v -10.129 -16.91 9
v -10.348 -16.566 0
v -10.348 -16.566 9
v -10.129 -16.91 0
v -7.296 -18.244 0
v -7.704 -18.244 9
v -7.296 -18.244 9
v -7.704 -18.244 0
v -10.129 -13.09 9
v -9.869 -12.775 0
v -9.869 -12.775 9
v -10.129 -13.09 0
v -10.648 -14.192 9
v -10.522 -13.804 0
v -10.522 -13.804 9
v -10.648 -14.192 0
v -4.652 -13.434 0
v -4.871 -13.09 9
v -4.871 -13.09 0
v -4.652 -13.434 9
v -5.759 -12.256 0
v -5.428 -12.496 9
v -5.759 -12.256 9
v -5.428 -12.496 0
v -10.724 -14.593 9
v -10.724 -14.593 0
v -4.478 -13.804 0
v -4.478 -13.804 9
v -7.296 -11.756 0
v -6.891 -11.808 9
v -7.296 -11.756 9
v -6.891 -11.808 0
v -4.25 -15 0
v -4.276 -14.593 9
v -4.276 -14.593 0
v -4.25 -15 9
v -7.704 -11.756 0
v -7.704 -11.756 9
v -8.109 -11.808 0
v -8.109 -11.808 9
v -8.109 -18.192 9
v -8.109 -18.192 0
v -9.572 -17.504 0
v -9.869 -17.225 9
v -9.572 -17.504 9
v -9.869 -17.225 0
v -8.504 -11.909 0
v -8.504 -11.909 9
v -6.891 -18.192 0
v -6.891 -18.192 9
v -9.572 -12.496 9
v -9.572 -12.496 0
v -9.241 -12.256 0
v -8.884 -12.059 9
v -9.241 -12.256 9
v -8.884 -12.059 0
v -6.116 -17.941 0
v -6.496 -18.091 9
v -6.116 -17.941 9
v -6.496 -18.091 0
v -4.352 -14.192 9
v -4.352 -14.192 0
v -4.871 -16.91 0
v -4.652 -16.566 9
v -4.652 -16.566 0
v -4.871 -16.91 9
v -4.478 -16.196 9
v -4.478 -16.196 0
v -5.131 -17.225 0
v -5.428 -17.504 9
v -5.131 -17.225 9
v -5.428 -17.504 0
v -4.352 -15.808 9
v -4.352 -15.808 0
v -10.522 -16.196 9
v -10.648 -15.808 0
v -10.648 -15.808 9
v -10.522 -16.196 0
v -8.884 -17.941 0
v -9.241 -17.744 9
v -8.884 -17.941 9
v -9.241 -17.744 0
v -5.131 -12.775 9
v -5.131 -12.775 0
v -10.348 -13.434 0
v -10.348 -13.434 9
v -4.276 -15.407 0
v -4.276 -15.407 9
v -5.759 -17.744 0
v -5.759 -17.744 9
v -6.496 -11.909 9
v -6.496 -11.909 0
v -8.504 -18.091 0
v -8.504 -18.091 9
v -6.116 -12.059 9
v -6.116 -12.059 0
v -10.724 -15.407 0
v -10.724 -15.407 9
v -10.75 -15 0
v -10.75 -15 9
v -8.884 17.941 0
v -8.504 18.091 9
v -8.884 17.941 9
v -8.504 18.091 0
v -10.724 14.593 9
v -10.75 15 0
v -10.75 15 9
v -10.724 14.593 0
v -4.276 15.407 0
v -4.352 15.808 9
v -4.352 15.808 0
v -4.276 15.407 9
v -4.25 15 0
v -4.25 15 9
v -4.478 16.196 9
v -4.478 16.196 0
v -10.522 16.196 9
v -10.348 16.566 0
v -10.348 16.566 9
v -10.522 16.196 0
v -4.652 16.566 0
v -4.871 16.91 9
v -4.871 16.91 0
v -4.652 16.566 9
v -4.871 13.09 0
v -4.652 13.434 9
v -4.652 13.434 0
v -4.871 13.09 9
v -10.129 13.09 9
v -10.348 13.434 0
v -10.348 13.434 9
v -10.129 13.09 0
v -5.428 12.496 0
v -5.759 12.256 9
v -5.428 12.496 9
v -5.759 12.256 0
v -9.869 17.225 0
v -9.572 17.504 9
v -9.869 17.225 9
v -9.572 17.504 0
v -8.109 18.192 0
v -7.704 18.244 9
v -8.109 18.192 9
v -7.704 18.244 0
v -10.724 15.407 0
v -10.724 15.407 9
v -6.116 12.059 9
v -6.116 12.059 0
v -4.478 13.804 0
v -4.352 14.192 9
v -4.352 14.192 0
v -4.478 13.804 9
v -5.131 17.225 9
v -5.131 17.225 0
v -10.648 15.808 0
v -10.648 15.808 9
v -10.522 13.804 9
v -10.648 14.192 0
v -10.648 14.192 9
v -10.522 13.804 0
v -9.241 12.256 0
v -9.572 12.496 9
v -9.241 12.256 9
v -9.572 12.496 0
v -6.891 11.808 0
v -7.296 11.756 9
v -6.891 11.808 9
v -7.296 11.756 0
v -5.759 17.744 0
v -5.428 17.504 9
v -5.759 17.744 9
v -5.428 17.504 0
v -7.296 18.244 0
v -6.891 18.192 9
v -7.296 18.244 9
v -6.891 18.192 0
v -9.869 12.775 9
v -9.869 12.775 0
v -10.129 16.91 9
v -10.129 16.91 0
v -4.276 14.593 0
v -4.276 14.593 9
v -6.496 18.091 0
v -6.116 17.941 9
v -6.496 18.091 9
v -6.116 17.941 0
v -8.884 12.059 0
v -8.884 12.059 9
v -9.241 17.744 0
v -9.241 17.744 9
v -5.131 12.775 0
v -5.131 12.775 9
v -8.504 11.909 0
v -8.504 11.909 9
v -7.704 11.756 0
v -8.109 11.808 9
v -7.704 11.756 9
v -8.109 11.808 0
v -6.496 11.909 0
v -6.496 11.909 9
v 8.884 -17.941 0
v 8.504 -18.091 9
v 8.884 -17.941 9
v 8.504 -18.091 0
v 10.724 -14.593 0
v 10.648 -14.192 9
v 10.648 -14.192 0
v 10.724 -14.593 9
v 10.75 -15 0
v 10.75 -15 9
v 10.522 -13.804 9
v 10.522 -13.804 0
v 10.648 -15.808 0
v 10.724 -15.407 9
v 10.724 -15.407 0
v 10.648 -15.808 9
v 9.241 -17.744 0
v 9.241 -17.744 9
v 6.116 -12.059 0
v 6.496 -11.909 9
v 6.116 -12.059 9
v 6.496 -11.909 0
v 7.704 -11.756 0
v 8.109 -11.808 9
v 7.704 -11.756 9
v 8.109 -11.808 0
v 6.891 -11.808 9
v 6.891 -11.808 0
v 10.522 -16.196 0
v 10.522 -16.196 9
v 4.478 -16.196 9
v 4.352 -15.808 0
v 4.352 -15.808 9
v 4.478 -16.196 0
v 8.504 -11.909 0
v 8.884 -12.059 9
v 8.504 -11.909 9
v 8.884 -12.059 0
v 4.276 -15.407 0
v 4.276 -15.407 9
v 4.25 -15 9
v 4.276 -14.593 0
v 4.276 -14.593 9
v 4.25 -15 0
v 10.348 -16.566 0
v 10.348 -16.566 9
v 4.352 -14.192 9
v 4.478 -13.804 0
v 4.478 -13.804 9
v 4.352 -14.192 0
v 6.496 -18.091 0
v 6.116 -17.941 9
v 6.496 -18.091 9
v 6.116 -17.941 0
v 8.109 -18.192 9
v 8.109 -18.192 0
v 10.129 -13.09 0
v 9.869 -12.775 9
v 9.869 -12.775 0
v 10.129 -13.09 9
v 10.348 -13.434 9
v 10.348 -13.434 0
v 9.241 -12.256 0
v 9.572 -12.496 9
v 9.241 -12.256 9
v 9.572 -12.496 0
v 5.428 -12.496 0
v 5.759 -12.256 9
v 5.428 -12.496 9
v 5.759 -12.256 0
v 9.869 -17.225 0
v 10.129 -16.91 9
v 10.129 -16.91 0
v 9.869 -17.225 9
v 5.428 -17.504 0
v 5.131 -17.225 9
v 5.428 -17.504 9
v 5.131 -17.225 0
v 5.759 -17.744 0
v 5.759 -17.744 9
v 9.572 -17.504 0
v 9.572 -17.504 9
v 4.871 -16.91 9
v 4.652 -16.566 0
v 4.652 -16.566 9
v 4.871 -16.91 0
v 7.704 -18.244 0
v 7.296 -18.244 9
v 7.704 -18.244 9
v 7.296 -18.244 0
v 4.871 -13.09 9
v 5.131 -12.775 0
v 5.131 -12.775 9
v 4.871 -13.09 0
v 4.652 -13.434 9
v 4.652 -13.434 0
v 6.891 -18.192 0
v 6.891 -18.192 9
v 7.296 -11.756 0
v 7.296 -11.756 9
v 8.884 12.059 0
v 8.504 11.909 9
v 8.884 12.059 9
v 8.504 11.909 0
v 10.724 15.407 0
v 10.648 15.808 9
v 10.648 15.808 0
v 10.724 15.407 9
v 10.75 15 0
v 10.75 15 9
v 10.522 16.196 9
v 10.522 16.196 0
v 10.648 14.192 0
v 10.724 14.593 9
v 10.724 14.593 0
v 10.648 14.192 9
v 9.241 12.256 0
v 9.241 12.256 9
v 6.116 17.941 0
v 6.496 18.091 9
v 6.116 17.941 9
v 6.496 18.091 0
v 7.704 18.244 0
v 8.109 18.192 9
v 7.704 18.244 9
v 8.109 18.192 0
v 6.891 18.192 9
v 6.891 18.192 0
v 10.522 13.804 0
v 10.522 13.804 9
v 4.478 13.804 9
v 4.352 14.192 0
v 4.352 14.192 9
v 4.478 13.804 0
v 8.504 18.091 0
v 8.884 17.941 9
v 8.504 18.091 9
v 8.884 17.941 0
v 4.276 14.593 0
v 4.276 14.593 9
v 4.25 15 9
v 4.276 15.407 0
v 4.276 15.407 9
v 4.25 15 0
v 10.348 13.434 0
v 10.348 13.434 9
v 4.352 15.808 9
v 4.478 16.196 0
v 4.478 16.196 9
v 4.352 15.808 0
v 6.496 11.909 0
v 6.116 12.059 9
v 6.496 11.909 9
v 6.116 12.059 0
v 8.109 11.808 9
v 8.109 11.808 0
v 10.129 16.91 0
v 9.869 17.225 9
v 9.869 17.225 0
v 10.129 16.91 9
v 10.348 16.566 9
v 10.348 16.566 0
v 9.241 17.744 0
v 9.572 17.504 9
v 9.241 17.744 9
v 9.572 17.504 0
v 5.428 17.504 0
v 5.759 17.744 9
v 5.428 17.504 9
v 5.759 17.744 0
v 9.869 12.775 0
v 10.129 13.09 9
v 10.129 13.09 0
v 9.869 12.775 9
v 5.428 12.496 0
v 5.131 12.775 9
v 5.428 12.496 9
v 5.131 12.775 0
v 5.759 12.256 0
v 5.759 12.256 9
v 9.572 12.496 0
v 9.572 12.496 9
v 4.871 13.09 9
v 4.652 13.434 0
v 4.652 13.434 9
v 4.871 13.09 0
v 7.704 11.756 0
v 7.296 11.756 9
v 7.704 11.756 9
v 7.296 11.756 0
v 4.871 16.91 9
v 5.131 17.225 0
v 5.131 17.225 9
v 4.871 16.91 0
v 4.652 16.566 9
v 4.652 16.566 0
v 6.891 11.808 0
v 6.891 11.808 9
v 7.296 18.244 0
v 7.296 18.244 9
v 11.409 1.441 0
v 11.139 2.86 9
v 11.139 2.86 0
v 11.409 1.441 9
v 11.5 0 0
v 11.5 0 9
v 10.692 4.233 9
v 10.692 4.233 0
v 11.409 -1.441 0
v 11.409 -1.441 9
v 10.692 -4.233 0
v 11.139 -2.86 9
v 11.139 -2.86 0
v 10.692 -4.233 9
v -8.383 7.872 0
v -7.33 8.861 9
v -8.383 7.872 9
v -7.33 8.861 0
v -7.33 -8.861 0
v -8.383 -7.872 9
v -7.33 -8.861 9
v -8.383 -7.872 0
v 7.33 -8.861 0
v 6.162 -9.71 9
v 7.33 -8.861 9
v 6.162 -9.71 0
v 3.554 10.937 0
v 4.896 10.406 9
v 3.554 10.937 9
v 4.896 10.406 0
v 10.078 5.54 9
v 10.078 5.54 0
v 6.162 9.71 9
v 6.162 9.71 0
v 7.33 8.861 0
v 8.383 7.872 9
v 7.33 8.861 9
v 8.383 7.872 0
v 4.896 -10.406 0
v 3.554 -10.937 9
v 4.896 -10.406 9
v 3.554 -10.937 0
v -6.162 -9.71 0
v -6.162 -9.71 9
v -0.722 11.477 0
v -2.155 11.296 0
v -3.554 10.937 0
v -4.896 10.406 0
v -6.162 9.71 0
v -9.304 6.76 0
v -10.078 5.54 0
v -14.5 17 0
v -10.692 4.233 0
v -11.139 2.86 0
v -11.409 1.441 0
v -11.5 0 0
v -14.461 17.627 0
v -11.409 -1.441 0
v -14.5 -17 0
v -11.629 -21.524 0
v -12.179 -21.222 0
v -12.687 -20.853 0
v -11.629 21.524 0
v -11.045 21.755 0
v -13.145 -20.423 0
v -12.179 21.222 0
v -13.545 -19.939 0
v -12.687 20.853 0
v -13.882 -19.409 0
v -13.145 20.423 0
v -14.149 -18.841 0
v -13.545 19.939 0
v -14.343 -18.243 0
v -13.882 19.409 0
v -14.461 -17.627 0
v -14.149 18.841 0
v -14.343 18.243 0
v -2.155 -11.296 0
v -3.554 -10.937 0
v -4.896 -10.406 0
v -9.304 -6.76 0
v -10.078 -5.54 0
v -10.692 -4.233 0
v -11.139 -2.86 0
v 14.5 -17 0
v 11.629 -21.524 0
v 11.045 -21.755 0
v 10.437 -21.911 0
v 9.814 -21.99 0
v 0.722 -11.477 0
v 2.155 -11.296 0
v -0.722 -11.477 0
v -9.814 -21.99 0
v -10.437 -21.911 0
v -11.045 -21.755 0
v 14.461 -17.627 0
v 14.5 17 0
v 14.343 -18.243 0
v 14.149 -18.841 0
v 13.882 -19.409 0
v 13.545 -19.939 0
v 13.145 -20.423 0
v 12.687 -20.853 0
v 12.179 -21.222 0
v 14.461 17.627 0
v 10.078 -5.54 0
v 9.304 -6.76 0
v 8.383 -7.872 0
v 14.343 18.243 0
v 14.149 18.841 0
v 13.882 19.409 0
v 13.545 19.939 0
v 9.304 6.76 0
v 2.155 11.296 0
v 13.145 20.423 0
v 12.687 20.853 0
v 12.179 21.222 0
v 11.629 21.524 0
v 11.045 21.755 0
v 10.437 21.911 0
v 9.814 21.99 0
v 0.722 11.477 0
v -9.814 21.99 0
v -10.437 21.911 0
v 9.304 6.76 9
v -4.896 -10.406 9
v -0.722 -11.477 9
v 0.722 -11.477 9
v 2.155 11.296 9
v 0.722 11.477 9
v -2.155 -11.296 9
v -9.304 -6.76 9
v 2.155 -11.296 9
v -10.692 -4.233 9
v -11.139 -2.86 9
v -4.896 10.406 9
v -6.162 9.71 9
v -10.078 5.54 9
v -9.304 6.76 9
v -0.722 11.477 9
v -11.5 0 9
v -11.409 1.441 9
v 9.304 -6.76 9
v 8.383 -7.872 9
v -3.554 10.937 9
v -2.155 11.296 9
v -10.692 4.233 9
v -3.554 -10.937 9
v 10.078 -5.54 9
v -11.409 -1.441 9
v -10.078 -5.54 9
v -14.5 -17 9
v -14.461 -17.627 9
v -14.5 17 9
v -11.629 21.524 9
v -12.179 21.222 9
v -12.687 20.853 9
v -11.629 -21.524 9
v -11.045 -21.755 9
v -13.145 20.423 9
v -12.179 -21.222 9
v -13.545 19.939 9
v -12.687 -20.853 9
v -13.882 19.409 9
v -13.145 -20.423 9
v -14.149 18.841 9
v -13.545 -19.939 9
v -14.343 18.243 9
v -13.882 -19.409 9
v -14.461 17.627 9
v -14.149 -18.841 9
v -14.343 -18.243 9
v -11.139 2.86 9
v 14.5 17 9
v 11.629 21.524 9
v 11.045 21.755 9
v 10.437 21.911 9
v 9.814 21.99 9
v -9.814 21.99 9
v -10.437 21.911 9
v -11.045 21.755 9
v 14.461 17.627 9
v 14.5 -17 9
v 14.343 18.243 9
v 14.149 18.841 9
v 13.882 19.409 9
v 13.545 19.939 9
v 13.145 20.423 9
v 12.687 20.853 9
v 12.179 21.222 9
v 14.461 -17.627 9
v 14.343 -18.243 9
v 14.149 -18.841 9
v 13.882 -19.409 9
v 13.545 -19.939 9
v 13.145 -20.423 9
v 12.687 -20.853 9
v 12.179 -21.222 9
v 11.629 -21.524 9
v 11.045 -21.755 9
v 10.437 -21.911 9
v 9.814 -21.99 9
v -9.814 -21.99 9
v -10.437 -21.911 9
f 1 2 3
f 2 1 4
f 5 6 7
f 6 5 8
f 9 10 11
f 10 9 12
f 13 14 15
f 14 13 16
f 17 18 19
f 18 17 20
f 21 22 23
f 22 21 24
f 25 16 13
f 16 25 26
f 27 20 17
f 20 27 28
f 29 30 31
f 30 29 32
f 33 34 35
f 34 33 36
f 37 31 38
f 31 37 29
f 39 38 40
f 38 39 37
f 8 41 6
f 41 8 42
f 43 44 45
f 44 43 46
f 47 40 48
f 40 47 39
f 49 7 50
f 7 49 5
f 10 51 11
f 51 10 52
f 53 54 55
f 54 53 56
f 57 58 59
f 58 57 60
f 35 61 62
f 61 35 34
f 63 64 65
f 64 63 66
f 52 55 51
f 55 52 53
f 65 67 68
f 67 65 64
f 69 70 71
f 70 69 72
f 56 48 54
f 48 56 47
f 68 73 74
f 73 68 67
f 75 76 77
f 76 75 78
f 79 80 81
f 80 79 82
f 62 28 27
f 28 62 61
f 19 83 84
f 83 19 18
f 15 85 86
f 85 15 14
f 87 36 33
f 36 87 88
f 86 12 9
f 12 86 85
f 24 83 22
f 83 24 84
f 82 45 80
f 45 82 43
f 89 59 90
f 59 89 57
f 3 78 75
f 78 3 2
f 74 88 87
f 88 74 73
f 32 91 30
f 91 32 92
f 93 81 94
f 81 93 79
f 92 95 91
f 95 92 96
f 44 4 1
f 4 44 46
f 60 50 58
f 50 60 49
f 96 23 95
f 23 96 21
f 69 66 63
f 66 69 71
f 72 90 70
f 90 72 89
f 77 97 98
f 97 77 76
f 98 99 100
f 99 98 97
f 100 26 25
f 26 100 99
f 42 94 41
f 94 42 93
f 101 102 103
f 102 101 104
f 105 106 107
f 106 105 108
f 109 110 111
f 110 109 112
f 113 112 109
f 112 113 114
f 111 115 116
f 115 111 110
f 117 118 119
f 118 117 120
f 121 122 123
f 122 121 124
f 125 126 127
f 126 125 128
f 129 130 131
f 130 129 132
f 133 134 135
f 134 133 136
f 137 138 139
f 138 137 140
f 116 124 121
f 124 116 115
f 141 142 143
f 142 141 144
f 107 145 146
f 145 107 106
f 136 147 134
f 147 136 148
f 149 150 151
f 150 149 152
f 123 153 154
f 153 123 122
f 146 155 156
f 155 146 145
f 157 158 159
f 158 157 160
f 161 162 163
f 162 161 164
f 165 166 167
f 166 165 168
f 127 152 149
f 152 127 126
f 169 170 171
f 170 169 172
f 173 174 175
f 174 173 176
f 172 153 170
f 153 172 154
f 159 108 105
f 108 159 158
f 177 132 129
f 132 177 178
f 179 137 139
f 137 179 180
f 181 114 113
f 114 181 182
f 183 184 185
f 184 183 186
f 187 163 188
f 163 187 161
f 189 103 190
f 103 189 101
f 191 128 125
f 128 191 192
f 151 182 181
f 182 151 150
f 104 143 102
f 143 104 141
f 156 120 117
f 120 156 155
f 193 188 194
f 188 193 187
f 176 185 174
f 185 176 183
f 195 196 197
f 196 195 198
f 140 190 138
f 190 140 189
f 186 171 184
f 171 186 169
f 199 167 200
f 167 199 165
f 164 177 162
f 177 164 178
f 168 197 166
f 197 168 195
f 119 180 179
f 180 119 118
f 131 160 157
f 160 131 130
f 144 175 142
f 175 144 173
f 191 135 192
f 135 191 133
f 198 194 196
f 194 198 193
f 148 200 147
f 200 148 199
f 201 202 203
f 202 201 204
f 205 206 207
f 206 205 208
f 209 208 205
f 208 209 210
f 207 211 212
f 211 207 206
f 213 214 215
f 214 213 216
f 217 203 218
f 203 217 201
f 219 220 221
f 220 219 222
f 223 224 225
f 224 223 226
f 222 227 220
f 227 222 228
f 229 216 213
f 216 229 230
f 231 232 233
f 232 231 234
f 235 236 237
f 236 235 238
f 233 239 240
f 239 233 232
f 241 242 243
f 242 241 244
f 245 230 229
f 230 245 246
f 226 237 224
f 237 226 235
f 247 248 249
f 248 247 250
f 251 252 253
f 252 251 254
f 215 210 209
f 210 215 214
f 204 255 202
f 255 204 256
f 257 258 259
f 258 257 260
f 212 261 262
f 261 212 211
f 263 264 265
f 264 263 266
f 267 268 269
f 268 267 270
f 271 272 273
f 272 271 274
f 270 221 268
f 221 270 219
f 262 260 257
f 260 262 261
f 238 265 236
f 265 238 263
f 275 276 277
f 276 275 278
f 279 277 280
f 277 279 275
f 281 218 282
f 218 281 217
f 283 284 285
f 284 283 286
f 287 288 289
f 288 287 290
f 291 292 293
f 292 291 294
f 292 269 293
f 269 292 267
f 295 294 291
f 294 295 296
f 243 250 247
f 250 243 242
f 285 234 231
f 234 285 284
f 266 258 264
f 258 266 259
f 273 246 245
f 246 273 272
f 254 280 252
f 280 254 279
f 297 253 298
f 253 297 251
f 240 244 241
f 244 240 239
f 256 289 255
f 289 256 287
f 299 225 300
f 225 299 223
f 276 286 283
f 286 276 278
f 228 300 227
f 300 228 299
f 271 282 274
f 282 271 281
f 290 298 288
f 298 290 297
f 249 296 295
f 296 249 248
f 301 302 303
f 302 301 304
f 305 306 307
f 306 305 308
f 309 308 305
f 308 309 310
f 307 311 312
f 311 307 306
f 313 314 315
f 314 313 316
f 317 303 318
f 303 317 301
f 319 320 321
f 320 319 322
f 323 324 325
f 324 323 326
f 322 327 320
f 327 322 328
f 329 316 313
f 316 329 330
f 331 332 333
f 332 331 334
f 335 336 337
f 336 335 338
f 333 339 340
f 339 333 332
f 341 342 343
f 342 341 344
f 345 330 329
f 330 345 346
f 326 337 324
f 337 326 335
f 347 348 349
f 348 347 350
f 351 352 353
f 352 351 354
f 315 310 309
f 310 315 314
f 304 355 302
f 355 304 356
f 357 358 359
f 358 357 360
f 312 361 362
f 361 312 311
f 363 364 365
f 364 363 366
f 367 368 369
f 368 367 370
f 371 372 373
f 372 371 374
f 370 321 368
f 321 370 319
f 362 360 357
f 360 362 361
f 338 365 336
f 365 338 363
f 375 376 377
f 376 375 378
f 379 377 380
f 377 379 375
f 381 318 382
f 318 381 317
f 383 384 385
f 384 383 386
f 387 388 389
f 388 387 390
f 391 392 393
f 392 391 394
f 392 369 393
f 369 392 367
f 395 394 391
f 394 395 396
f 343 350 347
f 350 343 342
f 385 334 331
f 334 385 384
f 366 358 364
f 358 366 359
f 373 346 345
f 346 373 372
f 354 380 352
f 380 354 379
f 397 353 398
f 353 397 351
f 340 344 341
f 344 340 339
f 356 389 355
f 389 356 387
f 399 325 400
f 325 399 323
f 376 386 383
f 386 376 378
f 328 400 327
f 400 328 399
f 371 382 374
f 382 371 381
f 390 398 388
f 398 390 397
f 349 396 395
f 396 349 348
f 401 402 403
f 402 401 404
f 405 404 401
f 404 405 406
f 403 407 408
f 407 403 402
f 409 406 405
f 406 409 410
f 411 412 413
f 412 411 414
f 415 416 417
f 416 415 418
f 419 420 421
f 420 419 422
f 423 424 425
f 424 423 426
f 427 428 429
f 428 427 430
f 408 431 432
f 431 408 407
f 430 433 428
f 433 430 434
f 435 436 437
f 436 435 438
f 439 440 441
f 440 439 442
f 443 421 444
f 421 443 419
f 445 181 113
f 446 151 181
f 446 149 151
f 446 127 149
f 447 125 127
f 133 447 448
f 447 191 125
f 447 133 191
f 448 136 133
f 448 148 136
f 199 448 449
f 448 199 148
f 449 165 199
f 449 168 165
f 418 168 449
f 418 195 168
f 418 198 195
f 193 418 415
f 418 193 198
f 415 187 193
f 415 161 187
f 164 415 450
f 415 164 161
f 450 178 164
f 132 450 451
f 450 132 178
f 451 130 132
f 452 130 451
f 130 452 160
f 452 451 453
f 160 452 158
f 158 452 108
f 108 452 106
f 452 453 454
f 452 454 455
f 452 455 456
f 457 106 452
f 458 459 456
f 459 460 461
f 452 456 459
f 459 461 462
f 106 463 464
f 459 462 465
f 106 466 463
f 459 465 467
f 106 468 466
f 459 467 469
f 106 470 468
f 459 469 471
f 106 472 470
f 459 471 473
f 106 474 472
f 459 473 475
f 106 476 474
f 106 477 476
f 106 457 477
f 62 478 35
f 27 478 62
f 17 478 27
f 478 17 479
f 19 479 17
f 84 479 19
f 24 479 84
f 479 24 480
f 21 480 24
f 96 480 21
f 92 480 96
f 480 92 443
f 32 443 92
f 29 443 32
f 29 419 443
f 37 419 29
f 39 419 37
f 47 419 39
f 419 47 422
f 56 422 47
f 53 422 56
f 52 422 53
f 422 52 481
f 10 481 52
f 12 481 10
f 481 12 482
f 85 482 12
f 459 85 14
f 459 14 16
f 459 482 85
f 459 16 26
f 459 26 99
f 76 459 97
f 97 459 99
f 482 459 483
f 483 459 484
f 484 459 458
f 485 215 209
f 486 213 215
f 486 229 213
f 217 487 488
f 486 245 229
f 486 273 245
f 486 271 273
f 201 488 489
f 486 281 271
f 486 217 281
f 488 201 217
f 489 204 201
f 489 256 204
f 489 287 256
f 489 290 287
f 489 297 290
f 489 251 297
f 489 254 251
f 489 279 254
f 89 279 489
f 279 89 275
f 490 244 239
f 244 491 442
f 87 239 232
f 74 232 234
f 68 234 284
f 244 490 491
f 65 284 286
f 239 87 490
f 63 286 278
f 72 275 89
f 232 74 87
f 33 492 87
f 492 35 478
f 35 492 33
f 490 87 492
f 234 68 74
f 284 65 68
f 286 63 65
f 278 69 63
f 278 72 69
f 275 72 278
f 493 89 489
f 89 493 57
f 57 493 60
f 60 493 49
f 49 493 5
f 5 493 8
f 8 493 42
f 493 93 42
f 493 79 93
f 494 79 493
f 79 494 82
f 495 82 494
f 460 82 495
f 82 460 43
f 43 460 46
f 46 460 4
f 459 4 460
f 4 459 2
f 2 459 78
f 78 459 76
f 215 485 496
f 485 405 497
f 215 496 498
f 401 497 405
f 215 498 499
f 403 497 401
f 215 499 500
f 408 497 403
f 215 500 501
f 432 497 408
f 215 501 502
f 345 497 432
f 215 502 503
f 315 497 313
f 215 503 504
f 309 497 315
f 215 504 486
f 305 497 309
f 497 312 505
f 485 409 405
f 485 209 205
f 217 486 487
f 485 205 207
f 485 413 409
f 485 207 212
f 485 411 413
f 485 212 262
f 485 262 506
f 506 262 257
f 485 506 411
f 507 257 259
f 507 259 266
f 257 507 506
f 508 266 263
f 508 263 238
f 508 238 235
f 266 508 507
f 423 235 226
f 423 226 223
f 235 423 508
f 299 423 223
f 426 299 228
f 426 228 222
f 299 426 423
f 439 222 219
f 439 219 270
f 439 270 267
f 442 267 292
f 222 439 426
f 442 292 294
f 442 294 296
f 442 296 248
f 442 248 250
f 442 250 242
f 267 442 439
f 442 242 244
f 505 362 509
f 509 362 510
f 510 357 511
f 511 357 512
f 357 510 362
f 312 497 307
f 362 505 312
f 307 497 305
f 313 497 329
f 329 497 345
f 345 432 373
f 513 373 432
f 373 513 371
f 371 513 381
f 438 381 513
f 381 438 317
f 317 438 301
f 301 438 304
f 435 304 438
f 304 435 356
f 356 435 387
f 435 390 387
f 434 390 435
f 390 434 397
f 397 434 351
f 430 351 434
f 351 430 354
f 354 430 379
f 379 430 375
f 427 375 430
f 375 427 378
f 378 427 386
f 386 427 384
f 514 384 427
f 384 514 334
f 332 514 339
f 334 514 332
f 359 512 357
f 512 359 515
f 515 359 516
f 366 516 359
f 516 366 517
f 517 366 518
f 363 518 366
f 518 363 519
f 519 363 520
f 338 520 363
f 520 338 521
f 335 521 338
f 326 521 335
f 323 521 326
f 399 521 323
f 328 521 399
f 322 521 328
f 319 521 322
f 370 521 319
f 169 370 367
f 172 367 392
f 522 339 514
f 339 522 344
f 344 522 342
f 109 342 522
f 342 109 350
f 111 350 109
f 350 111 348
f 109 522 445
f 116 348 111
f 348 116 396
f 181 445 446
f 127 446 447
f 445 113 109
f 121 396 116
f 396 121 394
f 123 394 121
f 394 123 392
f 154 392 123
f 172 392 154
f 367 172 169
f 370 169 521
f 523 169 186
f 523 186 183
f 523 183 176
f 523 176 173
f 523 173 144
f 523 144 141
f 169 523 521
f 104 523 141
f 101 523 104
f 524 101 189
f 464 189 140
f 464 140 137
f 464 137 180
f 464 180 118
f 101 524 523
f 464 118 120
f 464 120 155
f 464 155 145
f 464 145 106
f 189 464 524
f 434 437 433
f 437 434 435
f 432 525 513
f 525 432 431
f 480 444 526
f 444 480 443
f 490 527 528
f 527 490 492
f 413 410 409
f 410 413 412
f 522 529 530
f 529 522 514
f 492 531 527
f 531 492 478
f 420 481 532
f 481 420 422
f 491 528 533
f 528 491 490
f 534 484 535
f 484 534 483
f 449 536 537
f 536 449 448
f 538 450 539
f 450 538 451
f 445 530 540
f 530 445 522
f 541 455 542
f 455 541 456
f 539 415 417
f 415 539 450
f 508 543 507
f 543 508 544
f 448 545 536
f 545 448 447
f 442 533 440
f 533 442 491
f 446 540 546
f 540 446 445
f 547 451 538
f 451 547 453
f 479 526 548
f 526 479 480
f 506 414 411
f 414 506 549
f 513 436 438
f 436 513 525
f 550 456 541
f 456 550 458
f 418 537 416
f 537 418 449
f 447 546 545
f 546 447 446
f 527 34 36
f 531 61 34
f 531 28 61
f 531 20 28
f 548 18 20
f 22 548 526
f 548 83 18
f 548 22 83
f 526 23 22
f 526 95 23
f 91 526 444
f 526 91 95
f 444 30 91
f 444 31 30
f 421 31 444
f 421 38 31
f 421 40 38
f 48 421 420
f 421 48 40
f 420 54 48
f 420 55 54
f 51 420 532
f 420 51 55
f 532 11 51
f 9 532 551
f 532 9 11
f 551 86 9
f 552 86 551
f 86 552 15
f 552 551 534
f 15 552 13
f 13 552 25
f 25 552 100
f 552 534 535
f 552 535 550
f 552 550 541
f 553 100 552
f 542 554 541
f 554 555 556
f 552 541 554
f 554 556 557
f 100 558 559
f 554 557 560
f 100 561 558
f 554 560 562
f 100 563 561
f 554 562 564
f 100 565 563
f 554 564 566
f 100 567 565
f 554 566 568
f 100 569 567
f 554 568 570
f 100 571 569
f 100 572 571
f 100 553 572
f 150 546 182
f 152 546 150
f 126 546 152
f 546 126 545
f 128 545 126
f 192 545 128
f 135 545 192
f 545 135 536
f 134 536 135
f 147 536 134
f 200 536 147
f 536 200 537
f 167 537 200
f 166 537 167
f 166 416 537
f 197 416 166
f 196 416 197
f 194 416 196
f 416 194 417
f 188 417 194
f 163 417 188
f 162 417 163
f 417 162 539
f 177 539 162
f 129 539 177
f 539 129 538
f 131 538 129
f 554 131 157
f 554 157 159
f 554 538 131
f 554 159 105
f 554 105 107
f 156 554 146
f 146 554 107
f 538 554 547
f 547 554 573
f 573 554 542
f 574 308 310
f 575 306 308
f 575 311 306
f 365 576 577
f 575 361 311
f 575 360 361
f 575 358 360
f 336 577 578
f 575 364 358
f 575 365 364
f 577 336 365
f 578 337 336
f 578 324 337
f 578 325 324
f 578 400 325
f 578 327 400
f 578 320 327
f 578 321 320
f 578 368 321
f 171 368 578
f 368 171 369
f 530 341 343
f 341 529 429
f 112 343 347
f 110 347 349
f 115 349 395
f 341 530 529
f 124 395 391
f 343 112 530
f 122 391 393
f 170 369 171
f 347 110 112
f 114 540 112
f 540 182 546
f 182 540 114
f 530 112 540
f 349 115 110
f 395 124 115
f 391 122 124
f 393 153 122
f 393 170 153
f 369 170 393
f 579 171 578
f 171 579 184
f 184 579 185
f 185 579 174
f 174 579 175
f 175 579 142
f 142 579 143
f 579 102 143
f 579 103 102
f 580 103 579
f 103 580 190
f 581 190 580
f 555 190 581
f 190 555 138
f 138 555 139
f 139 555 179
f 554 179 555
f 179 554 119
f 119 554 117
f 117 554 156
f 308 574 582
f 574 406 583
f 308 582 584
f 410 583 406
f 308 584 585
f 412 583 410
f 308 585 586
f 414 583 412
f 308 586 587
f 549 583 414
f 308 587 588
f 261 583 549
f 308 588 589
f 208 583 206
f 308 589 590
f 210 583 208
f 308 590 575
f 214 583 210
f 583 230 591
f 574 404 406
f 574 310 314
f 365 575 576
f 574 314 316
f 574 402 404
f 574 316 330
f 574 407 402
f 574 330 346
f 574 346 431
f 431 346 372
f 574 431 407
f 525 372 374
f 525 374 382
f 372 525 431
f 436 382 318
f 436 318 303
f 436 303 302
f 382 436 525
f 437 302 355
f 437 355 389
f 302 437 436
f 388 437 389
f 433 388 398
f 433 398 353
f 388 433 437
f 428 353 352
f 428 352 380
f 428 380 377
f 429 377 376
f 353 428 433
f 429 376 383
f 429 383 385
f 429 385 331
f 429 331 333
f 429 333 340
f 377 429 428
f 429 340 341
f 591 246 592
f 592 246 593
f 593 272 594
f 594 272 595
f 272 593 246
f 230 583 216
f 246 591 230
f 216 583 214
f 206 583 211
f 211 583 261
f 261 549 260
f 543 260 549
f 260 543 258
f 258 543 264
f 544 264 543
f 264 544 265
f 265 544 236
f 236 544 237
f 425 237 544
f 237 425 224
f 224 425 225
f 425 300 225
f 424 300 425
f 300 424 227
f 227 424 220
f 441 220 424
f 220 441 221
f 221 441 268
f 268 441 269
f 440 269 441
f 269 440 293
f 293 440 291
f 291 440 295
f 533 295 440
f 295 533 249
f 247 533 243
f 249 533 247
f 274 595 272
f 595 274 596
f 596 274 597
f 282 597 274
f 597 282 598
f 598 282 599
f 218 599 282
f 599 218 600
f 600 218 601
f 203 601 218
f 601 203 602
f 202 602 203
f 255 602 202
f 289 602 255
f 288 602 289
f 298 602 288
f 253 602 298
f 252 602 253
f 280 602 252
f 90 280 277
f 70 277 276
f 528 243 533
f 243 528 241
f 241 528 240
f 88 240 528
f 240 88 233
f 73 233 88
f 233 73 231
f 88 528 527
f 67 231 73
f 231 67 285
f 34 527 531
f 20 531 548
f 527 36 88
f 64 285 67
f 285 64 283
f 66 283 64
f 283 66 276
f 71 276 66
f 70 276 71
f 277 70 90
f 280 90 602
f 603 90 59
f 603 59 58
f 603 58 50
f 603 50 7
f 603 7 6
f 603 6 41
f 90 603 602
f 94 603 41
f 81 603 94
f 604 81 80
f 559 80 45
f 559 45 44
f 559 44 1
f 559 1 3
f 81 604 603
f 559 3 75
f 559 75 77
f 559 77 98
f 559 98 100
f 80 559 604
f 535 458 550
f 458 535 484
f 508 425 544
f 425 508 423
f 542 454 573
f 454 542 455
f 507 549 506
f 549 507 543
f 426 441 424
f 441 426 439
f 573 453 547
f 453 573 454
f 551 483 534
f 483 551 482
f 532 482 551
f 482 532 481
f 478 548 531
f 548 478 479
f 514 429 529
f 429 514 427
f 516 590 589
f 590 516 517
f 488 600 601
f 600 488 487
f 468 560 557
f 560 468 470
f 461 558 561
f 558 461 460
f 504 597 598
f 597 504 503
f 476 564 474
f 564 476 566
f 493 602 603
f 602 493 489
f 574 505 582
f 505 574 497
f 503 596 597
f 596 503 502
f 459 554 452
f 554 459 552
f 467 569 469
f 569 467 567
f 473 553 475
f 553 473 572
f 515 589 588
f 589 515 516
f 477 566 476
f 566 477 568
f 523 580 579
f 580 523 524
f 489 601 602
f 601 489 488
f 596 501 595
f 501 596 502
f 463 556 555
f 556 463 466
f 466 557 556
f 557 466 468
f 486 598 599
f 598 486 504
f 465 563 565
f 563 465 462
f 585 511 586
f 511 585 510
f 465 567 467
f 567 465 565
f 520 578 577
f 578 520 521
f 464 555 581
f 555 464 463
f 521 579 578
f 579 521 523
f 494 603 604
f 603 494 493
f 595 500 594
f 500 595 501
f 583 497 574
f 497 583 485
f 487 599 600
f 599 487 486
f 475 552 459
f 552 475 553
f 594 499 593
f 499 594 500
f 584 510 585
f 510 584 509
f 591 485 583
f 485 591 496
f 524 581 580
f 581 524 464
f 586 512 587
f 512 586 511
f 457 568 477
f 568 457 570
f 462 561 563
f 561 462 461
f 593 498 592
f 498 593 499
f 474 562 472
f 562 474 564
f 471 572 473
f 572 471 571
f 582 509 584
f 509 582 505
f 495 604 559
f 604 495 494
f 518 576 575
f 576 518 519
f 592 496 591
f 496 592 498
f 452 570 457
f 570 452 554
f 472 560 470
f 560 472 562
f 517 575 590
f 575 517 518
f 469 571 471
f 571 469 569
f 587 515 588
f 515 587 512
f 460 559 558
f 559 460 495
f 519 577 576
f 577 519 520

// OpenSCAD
$fn = 50;


difference() {
	union() {
		hull() {
			translate(v = [-9.5000000000, 17.0000000000, 0]) {
				cylinder(h = 9, r = 5);
			}
			translate(v = [9.5000000000, 17.0000000000, 0]) {
				cylinder(h = 9, r = 5);
			}
			translate(v = [-9.5000000000, -17.0000000000, 0]) {
				cylinder(h = 9, r = 5);
			}
			translate(v = [9.5000000000, -17.0000000000, 0]) {
				cylinder(h = 9, r = 5);
			}
		}
	}
	union() {
		#translate(v = [-7.5000000000, -15.0000000000, -100.0000000000]) {
			cylinder(h = 200, r = 3.2500000000);
		}
		#translate(v = [-7.5000000000, 15.0000000000, -100.0000000000]) {
			cylinder(h = 200, r = 3.2500000000);
		}
		#translate(v = [7.5000000000, -15.0000000000, -100.0000000000]) {
			cylinder(h = 200, r = 3.2500000000);
		}
		#translate(v = [7.5000000000, 15.0000000000, -100.0000000000]) {
			cylinder(h = 200, r = 3.2500000000);
		}
		#cylinder(h = 9, r = 11.5000000000);
	}
}
